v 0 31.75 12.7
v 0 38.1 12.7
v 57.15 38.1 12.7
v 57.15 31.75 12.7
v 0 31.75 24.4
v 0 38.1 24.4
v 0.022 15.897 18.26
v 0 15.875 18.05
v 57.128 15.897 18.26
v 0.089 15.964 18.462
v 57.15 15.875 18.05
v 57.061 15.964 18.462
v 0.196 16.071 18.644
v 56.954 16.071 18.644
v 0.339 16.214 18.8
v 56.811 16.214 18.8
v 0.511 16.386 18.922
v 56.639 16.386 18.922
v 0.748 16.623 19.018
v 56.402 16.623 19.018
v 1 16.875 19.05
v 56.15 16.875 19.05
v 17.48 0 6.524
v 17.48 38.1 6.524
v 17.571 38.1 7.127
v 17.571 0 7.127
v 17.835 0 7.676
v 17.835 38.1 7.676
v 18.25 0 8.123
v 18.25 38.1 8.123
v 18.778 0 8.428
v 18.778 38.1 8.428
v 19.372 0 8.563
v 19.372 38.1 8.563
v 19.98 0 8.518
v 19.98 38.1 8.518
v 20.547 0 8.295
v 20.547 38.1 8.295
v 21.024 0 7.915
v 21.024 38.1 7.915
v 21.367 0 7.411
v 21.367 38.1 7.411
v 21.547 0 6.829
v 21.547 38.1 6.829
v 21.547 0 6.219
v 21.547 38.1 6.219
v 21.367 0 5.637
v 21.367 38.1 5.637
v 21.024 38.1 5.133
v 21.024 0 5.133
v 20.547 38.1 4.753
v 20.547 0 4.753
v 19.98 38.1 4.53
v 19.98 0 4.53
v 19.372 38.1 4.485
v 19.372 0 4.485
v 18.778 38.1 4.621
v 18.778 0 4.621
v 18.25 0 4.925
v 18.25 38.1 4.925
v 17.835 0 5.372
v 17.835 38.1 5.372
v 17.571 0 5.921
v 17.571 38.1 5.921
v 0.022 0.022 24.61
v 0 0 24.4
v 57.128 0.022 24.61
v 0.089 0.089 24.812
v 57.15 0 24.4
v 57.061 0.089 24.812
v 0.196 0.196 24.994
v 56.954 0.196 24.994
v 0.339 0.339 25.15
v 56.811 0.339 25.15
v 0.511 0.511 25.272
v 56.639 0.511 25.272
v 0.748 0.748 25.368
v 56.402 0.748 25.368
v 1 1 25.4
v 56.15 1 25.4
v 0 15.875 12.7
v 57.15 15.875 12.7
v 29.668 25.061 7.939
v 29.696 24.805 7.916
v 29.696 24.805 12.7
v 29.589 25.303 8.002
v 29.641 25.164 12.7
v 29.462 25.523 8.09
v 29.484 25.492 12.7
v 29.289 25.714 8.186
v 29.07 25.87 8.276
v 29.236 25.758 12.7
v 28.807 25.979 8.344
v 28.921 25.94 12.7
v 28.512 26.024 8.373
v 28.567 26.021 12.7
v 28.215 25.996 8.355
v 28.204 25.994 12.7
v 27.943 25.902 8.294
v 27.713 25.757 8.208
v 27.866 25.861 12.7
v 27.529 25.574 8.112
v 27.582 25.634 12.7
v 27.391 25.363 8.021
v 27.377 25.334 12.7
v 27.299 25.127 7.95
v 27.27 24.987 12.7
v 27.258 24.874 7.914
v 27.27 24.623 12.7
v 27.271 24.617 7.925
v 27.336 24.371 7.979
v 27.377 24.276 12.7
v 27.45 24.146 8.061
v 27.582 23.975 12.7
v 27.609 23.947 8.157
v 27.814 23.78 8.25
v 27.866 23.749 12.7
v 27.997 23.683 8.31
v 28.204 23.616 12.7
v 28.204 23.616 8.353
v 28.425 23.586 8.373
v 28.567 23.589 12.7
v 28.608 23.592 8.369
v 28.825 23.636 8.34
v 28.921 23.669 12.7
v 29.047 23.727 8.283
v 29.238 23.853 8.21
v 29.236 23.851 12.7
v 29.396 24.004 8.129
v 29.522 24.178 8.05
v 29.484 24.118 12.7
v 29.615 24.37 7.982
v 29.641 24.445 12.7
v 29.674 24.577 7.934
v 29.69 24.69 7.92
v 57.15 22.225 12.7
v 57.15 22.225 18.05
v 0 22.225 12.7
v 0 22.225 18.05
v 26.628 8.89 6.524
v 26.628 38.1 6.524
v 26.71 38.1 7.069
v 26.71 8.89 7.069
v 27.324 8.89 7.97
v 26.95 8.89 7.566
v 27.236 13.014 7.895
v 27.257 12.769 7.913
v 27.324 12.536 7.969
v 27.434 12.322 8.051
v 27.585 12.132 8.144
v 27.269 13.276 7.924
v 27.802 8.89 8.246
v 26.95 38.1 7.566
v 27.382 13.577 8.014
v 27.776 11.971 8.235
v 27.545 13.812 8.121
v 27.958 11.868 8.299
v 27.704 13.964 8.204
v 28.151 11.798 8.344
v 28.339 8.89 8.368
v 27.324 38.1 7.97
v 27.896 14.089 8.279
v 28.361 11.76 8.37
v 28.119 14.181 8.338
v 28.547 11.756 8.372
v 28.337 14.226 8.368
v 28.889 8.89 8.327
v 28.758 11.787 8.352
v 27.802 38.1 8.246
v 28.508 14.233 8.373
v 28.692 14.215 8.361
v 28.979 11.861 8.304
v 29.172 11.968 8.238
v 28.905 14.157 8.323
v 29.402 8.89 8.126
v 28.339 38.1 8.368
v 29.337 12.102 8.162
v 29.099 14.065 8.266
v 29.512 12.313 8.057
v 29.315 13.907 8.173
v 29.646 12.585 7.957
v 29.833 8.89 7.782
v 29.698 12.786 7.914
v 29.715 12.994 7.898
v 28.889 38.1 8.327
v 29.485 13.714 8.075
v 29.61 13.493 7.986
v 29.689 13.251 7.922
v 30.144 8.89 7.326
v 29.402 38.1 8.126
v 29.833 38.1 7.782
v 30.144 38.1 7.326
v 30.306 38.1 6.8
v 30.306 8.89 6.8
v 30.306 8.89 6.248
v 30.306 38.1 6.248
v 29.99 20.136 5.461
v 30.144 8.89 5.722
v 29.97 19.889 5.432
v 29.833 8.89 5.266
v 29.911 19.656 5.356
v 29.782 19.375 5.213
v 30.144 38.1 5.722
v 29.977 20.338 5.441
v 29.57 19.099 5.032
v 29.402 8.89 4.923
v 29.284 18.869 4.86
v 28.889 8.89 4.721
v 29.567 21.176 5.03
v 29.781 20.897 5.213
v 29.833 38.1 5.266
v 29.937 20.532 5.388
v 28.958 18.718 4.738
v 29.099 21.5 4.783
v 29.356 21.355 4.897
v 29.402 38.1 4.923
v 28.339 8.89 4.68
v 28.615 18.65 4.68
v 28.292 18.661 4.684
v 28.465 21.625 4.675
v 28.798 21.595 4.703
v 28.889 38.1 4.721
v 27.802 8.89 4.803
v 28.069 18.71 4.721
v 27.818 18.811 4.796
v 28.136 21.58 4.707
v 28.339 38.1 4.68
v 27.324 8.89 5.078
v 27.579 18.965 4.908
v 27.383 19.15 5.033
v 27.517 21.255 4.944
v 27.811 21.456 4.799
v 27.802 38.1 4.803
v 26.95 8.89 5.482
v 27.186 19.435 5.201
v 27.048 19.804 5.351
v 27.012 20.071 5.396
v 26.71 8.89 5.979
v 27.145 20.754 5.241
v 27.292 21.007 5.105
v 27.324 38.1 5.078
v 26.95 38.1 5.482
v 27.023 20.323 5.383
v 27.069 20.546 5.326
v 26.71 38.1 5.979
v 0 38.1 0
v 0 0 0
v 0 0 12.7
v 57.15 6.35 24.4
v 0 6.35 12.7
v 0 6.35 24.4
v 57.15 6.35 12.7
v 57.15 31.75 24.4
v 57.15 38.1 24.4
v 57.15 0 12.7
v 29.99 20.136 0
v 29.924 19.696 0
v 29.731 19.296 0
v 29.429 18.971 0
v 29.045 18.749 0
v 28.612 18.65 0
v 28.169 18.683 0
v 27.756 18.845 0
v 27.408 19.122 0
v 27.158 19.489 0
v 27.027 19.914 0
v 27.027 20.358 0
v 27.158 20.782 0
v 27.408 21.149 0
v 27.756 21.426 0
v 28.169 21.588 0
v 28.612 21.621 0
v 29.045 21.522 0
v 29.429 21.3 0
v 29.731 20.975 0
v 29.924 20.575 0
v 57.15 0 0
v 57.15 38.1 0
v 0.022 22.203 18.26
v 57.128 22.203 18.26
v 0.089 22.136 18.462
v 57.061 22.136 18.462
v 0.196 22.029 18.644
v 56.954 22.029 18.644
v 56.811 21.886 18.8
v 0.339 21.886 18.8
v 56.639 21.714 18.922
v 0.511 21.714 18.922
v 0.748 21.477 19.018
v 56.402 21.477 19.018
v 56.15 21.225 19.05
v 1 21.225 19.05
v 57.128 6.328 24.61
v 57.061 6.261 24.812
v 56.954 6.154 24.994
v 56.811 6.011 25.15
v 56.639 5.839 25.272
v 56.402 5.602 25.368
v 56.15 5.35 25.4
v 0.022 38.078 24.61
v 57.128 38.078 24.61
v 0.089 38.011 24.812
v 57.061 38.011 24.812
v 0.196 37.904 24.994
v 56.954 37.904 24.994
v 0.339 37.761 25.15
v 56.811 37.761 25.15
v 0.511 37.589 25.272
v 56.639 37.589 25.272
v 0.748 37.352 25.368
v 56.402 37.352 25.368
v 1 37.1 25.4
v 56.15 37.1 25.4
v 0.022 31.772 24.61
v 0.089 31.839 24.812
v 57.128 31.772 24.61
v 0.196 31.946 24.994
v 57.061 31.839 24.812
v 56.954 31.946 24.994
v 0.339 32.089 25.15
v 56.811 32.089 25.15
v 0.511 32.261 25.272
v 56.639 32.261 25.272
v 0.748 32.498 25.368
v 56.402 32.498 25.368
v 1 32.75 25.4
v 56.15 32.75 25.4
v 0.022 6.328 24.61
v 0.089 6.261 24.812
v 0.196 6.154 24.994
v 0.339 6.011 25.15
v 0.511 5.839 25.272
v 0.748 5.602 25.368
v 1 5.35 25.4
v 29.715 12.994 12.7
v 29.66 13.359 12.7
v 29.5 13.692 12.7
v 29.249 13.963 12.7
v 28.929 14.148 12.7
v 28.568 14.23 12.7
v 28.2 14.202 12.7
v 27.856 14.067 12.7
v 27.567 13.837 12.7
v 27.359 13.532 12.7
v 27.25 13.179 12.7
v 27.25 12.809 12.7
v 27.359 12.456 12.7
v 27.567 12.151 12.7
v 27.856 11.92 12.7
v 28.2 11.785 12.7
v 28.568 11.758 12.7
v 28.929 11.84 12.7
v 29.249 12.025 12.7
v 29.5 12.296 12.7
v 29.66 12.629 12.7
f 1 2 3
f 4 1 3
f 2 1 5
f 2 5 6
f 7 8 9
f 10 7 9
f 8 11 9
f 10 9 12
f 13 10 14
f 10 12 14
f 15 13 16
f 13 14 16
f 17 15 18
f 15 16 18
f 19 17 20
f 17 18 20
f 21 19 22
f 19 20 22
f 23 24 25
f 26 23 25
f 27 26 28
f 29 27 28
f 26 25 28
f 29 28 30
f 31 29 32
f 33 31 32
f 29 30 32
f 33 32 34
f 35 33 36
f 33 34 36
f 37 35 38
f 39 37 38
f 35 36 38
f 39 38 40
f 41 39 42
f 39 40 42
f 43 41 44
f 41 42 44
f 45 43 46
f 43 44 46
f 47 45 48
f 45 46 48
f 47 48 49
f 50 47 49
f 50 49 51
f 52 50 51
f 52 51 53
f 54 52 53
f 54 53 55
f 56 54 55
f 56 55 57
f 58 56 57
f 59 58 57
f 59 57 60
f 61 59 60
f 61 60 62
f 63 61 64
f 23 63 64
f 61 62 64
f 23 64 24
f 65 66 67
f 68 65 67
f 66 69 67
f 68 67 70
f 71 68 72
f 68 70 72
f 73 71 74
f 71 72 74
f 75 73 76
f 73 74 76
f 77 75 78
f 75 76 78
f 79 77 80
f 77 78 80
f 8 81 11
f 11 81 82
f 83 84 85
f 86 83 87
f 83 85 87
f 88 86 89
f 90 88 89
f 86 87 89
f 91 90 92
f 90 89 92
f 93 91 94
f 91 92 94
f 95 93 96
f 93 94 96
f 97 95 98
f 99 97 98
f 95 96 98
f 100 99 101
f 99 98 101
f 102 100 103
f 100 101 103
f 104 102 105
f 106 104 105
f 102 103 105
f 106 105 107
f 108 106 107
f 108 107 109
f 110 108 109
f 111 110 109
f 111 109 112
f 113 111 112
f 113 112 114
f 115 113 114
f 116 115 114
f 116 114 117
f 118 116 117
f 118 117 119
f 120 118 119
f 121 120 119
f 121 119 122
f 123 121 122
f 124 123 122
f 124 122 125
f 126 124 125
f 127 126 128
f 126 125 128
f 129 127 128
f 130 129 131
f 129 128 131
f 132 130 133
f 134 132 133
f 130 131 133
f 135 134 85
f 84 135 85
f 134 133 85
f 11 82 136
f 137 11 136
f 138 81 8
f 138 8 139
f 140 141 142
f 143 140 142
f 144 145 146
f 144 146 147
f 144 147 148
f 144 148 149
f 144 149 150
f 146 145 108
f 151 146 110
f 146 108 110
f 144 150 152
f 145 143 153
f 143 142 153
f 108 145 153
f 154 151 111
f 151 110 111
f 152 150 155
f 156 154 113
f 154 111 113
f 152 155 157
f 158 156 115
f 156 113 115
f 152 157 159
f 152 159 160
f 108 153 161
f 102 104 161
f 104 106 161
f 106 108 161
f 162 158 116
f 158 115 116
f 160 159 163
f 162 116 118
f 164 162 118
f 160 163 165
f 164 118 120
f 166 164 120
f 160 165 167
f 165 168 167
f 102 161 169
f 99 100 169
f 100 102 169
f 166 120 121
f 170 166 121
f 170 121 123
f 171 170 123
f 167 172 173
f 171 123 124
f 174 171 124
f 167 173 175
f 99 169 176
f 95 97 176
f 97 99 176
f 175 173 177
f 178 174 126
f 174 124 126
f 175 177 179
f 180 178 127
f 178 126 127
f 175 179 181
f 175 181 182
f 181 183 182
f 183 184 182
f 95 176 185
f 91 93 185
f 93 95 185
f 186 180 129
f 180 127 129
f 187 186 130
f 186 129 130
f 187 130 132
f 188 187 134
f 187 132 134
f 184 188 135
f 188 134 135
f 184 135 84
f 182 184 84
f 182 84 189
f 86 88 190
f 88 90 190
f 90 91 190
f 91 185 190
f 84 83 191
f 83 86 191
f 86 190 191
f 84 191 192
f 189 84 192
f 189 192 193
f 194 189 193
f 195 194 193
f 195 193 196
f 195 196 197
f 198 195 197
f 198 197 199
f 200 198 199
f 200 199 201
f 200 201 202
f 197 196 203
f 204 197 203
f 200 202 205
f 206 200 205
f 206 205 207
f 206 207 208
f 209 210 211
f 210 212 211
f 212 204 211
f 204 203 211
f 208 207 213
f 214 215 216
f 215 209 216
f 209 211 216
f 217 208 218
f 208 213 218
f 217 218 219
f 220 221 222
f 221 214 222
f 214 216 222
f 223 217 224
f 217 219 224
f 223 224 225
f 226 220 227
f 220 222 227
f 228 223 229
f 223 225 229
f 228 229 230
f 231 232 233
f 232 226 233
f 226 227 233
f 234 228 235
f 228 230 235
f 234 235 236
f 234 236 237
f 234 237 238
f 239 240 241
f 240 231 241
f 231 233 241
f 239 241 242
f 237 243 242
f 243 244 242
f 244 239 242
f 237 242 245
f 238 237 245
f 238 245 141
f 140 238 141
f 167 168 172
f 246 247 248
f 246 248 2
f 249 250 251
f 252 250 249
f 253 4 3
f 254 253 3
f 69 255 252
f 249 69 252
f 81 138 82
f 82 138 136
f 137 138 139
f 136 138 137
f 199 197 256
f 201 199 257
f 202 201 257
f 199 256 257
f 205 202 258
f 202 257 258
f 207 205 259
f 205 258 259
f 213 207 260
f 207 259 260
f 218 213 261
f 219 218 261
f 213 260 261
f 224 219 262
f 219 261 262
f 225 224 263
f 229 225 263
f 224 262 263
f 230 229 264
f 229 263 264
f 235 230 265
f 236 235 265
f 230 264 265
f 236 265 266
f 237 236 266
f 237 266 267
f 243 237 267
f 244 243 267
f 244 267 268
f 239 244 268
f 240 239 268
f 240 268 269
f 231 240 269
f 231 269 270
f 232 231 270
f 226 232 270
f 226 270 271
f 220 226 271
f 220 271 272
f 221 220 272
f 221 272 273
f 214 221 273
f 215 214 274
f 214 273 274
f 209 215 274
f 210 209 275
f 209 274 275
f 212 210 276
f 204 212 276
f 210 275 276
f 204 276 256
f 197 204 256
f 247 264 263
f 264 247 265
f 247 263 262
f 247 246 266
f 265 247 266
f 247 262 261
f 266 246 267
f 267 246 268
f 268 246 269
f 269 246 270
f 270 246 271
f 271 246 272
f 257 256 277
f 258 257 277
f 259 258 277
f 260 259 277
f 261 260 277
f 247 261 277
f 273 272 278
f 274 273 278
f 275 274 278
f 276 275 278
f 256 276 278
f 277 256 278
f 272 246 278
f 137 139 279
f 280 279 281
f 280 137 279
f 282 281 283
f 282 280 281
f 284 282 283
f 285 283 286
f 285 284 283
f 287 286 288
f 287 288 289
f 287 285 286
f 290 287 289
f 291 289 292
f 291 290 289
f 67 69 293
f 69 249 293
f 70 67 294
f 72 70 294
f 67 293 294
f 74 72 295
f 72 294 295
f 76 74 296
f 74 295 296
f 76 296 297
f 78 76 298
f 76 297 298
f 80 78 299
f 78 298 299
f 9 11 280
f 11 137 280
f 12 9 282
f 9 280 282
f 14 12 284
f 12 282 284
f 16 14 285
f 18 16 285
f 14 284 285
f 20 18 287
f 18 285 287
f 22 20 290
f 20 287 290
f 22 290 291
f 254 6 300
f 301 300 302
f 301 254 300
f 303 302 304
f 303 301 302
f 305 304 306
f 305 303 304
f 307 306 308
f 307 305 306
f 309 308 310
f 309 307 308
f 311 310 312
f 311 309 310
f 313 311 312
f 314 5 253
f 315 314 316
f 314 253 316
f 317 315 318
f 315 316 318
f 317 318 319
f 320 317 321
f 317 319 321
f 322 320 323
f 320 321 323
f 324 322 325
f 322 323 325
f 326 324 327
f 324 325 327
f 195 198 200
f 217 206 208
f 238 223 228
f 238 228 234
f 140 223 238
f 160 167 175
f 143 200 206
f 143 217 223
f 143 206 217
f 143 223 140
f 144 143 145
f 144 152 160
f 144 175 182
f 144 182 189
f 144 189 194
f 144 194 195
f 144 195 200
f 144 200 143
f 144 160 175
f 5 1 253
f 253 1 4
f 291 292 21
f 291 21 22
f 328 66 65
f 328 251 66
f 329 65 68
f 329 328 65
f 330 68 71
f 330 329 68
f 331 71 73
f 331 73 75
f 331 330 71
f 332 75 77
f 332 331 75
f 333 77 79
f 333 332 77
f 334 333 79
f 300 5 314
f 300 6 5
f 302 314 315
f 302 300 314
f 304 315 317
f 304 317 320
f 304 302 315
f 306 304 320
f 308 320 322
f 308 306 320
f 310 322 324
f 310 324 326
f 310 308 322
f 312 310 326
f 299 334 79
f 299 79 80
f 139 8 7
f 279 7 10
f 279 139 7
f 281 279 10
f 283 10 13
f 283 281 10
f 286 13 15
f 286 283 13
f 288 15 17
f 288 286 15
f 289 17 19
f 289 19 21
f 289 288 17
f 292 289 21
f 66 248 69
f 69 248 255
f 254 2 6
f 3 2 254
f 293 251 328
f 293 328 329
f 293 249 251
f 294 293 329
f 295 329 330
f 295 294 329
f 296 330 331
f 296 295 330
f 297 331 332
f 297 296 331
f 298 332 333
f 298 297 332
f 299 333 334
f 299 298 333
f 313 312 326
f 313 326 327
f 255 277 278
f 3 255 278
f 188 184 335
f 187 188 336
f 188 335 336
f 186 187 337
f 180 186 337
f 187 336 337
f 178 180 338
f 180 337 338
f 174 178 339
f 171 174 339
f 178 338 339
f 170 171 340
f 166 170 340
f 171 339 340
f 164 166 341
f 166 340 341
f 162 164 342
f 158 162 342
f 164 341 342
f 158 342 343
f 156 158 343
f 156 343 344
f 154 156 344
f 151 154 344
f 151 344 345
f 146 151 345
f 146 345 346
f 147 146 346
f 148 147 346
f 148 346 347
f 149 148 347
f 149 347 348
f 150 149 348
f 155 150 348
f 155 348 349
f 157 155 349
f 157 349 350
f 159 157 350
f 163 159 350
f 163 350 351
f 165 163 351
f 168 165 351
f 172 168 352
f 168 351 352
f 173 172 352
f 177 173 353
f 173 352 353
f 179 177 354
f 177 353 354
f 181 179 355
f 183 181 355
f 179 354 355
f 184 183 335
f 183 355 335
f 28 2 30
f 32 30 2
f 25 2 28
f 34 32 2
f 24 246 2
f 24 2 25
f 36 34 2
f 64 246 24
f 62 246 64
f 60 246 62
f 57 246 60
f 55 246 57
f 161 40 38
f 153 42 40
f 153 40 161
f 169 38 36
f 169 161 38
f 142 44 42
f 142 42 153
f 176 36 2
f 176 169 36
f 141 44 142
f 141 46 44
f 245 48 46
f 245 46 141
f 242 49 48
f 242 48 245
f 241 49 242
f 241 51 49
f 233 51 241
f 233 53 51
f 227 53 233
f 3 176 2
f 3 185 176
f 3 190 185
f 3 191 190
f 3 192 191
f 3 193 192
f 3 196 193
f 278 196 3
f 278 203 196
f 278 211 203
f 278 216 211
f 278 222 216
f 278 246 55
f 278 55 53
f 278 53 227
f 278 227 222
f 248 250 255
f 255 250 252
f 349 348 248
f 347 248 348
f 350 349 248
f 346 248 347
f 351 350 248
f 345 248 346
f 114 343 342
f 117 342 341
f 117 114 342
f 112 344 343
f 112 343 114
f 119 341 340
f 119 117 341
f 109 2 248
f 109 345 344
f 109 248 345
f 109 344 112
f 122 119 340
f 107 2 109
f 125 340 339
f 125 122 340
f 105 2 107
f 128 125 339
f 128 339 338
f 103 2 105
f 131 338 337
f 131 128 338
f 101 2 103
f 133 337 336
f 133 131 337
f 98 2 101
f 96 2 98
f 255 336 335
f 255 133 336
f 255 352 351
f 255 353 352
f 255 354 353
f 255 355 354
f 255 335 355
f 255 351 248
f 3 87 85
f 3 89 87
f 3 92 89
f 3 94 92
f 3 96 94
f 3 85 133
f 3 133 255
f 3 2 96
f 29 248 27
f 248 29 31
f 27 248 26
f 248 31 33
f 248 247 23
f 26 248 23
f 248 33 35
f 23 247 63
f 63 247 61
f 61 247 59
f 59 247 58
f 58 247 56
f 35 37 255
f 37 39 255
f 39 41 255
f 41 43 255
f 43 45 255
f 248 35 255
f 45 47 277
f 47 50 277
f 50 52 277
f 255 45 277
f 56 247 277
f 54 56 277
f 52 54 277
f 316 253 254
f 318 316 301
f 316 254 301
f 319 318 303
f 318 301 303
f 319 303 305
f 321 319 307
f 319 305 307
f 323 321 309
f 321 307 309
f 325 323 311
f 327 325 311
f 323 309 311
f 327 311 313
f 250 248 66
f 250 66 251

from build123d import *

# Parameters (mm, degrees)
BOX_W           = 57.15
BOX_H           = 38.1
BOX_DEPTH       = 12.7
SKETCH_R        = 1.239606
SKETCH_R_2      = 1.219716
POCKET_DEPTH    = 6.35
SKETCH001_R     = 1.849275
POCKET001_DEPTH = 29.21
SKETCH002_R     = 2.044943
POCKET002_DEPTH = 38.1
SKETCH003_R     = 1.489765
POCKET003_DEPTH = 6.35
BOX001_W        = 57.15
BOX001_H        = 6.35
BOX001_DEPTH    = 12.7
FILLET_R        = 1
BOX002_W        = 57.15
BOX002_H        = 6.35
BOX002_DEPTH    = 12.7
FILLET001_R     = 1
BOX003_W        = 57.15
BOX003_H        = 6.35
BOX003_DEPTH    = 6.35
FILLET002_R     = 1


with BuildPart() as pocket003:
    # Box → Box (new body)
    with BuildSketch(Plane.XY):
        with Locations((28.575, 19.05)):
            Rectangle(BOX_W, BOX_H)
    extrude(amount=BOX_DEPTH)

    # Sketch → Pocket (cut)
    with BuildSketch(Plane.XY.offset(12.7)):
        with Locations((28.475851, 12.993941)):
            Circle(SKETCH_R)
        with Locations((28.475851, 24.804882)):
            Circle(SKETCH_R_2)
    extrude(amount=-POCKET_DEPTH, mode=Mode.SUBTRACT)

    # Sketch001 → Pocket001 (cut)
    with BuildSketch(Plane(origin=(0, 38.1, 0), x_dir=(-1, 0, 0), z_dir=(0, 1, 0))):
        with Locations((-28.477482, 6.524108)):
            Circle(SKETCH001_R)
    extrude(amount=-POCKET001_DEPTH, mode=Mode.SUBTRACT)

    # Sketch002 → Pocket002 (cut)
    with BuildSketch(Plane(origin=(0, 38.1, 0), x_dir=(-1, 0, 0), z_dir=(0, 1, 0))):
        with Locations((-19.524696, 6.524108)):
            Circle(SKETCH002_R)
    extrude(amount=-POCKET002_DEPTH, mode=Mode.SUBTRACT)

    # Sketch003 → Pocket003 (cut)
    with BuildSketch(Plane(origin=(0, 0, 0), x_dir=(1, 0, 0), z_dir=(0, 0, -1))):
        with Locations((28.500566, -20.135597)):
            Circle(SKETCH003_R)
    extrude(amount=-POCKET003_DEPTH, mode=Mode.SUBTRACT)


with BuildPart() as fillet_body:
    # Box001 → Box001 (new body)
    with BuildSketch(Plane.XY.offset(12.7)):
        with Locations((28.575, 3.175)):
            Rectangle(BOX001_W, BOX001_H)
    extrude(amount=BOX001_DEPTH)

    # Fillet
    fillet_edges = [fillet_body.edges().sort_by_distance(p)[0] for p in [
        (0, 3.175, 25.4),
        (57.15, 3.175, 25.4),
        (28.575, 0, 25.4),
        (28.575, 6.35, 25.4),
    ]]
    fillet(fillet_edges, radius=FILLET_R)


with BuildPart() as fillet001:
    # Box002 → Box002 (new body)
    with BuildSketch(Plane(origin=(0, 31.75, 12.7), x_dir=(1, 0, 0), z_dir=(0, 0, 1))):
        with Locations((28.575, 3.175)):
            Rectangle(BOX002_W, BOX002_H)
    extrude(amount=BOX002_DEPTH)

    # Fillet001
    fillet001_edges = [fillet001.edges().sort_by_distance(p)[0] for p in [
        (0, 34.925, 25.4),
        (57.15, 34.925, 25.4),
        (28.575, 31.75, 25.4),
        (28.575, 38.1, 25.4),
    ]]
    fillet(fillet001_edges, radius=FILLET001_R)


with BuildPart() as fillet002:
    # Box003 → Box003 (new body)
    with BuildSketch(Plane(origin=(0, 15.875, 12.7), x_dir=(1, 0, 0), z_dir=(0, 0, 1))):
        with Locations((28.575, 3.175)):
            Rectangle(BOX003_W, BOX003_H)
    extrude(amount=BOX003_DEPTH)

    # Fillet002
    fillet002_edges = [fillet002.edges().sort_by_distance(p)[0] for p in [
        (0, 19.05, 19.05),
        (57.15, 19.05, 19.05),
        (28.575, 15.875, 19.05),
        (28.575, 22.225, 19.05),
    ]]
    fillet(fillet002_edges, radius=FILLET002_R)


solid = Compound([pocket003.part, fillet_body.part, fillet001.part, fillet002.part])
